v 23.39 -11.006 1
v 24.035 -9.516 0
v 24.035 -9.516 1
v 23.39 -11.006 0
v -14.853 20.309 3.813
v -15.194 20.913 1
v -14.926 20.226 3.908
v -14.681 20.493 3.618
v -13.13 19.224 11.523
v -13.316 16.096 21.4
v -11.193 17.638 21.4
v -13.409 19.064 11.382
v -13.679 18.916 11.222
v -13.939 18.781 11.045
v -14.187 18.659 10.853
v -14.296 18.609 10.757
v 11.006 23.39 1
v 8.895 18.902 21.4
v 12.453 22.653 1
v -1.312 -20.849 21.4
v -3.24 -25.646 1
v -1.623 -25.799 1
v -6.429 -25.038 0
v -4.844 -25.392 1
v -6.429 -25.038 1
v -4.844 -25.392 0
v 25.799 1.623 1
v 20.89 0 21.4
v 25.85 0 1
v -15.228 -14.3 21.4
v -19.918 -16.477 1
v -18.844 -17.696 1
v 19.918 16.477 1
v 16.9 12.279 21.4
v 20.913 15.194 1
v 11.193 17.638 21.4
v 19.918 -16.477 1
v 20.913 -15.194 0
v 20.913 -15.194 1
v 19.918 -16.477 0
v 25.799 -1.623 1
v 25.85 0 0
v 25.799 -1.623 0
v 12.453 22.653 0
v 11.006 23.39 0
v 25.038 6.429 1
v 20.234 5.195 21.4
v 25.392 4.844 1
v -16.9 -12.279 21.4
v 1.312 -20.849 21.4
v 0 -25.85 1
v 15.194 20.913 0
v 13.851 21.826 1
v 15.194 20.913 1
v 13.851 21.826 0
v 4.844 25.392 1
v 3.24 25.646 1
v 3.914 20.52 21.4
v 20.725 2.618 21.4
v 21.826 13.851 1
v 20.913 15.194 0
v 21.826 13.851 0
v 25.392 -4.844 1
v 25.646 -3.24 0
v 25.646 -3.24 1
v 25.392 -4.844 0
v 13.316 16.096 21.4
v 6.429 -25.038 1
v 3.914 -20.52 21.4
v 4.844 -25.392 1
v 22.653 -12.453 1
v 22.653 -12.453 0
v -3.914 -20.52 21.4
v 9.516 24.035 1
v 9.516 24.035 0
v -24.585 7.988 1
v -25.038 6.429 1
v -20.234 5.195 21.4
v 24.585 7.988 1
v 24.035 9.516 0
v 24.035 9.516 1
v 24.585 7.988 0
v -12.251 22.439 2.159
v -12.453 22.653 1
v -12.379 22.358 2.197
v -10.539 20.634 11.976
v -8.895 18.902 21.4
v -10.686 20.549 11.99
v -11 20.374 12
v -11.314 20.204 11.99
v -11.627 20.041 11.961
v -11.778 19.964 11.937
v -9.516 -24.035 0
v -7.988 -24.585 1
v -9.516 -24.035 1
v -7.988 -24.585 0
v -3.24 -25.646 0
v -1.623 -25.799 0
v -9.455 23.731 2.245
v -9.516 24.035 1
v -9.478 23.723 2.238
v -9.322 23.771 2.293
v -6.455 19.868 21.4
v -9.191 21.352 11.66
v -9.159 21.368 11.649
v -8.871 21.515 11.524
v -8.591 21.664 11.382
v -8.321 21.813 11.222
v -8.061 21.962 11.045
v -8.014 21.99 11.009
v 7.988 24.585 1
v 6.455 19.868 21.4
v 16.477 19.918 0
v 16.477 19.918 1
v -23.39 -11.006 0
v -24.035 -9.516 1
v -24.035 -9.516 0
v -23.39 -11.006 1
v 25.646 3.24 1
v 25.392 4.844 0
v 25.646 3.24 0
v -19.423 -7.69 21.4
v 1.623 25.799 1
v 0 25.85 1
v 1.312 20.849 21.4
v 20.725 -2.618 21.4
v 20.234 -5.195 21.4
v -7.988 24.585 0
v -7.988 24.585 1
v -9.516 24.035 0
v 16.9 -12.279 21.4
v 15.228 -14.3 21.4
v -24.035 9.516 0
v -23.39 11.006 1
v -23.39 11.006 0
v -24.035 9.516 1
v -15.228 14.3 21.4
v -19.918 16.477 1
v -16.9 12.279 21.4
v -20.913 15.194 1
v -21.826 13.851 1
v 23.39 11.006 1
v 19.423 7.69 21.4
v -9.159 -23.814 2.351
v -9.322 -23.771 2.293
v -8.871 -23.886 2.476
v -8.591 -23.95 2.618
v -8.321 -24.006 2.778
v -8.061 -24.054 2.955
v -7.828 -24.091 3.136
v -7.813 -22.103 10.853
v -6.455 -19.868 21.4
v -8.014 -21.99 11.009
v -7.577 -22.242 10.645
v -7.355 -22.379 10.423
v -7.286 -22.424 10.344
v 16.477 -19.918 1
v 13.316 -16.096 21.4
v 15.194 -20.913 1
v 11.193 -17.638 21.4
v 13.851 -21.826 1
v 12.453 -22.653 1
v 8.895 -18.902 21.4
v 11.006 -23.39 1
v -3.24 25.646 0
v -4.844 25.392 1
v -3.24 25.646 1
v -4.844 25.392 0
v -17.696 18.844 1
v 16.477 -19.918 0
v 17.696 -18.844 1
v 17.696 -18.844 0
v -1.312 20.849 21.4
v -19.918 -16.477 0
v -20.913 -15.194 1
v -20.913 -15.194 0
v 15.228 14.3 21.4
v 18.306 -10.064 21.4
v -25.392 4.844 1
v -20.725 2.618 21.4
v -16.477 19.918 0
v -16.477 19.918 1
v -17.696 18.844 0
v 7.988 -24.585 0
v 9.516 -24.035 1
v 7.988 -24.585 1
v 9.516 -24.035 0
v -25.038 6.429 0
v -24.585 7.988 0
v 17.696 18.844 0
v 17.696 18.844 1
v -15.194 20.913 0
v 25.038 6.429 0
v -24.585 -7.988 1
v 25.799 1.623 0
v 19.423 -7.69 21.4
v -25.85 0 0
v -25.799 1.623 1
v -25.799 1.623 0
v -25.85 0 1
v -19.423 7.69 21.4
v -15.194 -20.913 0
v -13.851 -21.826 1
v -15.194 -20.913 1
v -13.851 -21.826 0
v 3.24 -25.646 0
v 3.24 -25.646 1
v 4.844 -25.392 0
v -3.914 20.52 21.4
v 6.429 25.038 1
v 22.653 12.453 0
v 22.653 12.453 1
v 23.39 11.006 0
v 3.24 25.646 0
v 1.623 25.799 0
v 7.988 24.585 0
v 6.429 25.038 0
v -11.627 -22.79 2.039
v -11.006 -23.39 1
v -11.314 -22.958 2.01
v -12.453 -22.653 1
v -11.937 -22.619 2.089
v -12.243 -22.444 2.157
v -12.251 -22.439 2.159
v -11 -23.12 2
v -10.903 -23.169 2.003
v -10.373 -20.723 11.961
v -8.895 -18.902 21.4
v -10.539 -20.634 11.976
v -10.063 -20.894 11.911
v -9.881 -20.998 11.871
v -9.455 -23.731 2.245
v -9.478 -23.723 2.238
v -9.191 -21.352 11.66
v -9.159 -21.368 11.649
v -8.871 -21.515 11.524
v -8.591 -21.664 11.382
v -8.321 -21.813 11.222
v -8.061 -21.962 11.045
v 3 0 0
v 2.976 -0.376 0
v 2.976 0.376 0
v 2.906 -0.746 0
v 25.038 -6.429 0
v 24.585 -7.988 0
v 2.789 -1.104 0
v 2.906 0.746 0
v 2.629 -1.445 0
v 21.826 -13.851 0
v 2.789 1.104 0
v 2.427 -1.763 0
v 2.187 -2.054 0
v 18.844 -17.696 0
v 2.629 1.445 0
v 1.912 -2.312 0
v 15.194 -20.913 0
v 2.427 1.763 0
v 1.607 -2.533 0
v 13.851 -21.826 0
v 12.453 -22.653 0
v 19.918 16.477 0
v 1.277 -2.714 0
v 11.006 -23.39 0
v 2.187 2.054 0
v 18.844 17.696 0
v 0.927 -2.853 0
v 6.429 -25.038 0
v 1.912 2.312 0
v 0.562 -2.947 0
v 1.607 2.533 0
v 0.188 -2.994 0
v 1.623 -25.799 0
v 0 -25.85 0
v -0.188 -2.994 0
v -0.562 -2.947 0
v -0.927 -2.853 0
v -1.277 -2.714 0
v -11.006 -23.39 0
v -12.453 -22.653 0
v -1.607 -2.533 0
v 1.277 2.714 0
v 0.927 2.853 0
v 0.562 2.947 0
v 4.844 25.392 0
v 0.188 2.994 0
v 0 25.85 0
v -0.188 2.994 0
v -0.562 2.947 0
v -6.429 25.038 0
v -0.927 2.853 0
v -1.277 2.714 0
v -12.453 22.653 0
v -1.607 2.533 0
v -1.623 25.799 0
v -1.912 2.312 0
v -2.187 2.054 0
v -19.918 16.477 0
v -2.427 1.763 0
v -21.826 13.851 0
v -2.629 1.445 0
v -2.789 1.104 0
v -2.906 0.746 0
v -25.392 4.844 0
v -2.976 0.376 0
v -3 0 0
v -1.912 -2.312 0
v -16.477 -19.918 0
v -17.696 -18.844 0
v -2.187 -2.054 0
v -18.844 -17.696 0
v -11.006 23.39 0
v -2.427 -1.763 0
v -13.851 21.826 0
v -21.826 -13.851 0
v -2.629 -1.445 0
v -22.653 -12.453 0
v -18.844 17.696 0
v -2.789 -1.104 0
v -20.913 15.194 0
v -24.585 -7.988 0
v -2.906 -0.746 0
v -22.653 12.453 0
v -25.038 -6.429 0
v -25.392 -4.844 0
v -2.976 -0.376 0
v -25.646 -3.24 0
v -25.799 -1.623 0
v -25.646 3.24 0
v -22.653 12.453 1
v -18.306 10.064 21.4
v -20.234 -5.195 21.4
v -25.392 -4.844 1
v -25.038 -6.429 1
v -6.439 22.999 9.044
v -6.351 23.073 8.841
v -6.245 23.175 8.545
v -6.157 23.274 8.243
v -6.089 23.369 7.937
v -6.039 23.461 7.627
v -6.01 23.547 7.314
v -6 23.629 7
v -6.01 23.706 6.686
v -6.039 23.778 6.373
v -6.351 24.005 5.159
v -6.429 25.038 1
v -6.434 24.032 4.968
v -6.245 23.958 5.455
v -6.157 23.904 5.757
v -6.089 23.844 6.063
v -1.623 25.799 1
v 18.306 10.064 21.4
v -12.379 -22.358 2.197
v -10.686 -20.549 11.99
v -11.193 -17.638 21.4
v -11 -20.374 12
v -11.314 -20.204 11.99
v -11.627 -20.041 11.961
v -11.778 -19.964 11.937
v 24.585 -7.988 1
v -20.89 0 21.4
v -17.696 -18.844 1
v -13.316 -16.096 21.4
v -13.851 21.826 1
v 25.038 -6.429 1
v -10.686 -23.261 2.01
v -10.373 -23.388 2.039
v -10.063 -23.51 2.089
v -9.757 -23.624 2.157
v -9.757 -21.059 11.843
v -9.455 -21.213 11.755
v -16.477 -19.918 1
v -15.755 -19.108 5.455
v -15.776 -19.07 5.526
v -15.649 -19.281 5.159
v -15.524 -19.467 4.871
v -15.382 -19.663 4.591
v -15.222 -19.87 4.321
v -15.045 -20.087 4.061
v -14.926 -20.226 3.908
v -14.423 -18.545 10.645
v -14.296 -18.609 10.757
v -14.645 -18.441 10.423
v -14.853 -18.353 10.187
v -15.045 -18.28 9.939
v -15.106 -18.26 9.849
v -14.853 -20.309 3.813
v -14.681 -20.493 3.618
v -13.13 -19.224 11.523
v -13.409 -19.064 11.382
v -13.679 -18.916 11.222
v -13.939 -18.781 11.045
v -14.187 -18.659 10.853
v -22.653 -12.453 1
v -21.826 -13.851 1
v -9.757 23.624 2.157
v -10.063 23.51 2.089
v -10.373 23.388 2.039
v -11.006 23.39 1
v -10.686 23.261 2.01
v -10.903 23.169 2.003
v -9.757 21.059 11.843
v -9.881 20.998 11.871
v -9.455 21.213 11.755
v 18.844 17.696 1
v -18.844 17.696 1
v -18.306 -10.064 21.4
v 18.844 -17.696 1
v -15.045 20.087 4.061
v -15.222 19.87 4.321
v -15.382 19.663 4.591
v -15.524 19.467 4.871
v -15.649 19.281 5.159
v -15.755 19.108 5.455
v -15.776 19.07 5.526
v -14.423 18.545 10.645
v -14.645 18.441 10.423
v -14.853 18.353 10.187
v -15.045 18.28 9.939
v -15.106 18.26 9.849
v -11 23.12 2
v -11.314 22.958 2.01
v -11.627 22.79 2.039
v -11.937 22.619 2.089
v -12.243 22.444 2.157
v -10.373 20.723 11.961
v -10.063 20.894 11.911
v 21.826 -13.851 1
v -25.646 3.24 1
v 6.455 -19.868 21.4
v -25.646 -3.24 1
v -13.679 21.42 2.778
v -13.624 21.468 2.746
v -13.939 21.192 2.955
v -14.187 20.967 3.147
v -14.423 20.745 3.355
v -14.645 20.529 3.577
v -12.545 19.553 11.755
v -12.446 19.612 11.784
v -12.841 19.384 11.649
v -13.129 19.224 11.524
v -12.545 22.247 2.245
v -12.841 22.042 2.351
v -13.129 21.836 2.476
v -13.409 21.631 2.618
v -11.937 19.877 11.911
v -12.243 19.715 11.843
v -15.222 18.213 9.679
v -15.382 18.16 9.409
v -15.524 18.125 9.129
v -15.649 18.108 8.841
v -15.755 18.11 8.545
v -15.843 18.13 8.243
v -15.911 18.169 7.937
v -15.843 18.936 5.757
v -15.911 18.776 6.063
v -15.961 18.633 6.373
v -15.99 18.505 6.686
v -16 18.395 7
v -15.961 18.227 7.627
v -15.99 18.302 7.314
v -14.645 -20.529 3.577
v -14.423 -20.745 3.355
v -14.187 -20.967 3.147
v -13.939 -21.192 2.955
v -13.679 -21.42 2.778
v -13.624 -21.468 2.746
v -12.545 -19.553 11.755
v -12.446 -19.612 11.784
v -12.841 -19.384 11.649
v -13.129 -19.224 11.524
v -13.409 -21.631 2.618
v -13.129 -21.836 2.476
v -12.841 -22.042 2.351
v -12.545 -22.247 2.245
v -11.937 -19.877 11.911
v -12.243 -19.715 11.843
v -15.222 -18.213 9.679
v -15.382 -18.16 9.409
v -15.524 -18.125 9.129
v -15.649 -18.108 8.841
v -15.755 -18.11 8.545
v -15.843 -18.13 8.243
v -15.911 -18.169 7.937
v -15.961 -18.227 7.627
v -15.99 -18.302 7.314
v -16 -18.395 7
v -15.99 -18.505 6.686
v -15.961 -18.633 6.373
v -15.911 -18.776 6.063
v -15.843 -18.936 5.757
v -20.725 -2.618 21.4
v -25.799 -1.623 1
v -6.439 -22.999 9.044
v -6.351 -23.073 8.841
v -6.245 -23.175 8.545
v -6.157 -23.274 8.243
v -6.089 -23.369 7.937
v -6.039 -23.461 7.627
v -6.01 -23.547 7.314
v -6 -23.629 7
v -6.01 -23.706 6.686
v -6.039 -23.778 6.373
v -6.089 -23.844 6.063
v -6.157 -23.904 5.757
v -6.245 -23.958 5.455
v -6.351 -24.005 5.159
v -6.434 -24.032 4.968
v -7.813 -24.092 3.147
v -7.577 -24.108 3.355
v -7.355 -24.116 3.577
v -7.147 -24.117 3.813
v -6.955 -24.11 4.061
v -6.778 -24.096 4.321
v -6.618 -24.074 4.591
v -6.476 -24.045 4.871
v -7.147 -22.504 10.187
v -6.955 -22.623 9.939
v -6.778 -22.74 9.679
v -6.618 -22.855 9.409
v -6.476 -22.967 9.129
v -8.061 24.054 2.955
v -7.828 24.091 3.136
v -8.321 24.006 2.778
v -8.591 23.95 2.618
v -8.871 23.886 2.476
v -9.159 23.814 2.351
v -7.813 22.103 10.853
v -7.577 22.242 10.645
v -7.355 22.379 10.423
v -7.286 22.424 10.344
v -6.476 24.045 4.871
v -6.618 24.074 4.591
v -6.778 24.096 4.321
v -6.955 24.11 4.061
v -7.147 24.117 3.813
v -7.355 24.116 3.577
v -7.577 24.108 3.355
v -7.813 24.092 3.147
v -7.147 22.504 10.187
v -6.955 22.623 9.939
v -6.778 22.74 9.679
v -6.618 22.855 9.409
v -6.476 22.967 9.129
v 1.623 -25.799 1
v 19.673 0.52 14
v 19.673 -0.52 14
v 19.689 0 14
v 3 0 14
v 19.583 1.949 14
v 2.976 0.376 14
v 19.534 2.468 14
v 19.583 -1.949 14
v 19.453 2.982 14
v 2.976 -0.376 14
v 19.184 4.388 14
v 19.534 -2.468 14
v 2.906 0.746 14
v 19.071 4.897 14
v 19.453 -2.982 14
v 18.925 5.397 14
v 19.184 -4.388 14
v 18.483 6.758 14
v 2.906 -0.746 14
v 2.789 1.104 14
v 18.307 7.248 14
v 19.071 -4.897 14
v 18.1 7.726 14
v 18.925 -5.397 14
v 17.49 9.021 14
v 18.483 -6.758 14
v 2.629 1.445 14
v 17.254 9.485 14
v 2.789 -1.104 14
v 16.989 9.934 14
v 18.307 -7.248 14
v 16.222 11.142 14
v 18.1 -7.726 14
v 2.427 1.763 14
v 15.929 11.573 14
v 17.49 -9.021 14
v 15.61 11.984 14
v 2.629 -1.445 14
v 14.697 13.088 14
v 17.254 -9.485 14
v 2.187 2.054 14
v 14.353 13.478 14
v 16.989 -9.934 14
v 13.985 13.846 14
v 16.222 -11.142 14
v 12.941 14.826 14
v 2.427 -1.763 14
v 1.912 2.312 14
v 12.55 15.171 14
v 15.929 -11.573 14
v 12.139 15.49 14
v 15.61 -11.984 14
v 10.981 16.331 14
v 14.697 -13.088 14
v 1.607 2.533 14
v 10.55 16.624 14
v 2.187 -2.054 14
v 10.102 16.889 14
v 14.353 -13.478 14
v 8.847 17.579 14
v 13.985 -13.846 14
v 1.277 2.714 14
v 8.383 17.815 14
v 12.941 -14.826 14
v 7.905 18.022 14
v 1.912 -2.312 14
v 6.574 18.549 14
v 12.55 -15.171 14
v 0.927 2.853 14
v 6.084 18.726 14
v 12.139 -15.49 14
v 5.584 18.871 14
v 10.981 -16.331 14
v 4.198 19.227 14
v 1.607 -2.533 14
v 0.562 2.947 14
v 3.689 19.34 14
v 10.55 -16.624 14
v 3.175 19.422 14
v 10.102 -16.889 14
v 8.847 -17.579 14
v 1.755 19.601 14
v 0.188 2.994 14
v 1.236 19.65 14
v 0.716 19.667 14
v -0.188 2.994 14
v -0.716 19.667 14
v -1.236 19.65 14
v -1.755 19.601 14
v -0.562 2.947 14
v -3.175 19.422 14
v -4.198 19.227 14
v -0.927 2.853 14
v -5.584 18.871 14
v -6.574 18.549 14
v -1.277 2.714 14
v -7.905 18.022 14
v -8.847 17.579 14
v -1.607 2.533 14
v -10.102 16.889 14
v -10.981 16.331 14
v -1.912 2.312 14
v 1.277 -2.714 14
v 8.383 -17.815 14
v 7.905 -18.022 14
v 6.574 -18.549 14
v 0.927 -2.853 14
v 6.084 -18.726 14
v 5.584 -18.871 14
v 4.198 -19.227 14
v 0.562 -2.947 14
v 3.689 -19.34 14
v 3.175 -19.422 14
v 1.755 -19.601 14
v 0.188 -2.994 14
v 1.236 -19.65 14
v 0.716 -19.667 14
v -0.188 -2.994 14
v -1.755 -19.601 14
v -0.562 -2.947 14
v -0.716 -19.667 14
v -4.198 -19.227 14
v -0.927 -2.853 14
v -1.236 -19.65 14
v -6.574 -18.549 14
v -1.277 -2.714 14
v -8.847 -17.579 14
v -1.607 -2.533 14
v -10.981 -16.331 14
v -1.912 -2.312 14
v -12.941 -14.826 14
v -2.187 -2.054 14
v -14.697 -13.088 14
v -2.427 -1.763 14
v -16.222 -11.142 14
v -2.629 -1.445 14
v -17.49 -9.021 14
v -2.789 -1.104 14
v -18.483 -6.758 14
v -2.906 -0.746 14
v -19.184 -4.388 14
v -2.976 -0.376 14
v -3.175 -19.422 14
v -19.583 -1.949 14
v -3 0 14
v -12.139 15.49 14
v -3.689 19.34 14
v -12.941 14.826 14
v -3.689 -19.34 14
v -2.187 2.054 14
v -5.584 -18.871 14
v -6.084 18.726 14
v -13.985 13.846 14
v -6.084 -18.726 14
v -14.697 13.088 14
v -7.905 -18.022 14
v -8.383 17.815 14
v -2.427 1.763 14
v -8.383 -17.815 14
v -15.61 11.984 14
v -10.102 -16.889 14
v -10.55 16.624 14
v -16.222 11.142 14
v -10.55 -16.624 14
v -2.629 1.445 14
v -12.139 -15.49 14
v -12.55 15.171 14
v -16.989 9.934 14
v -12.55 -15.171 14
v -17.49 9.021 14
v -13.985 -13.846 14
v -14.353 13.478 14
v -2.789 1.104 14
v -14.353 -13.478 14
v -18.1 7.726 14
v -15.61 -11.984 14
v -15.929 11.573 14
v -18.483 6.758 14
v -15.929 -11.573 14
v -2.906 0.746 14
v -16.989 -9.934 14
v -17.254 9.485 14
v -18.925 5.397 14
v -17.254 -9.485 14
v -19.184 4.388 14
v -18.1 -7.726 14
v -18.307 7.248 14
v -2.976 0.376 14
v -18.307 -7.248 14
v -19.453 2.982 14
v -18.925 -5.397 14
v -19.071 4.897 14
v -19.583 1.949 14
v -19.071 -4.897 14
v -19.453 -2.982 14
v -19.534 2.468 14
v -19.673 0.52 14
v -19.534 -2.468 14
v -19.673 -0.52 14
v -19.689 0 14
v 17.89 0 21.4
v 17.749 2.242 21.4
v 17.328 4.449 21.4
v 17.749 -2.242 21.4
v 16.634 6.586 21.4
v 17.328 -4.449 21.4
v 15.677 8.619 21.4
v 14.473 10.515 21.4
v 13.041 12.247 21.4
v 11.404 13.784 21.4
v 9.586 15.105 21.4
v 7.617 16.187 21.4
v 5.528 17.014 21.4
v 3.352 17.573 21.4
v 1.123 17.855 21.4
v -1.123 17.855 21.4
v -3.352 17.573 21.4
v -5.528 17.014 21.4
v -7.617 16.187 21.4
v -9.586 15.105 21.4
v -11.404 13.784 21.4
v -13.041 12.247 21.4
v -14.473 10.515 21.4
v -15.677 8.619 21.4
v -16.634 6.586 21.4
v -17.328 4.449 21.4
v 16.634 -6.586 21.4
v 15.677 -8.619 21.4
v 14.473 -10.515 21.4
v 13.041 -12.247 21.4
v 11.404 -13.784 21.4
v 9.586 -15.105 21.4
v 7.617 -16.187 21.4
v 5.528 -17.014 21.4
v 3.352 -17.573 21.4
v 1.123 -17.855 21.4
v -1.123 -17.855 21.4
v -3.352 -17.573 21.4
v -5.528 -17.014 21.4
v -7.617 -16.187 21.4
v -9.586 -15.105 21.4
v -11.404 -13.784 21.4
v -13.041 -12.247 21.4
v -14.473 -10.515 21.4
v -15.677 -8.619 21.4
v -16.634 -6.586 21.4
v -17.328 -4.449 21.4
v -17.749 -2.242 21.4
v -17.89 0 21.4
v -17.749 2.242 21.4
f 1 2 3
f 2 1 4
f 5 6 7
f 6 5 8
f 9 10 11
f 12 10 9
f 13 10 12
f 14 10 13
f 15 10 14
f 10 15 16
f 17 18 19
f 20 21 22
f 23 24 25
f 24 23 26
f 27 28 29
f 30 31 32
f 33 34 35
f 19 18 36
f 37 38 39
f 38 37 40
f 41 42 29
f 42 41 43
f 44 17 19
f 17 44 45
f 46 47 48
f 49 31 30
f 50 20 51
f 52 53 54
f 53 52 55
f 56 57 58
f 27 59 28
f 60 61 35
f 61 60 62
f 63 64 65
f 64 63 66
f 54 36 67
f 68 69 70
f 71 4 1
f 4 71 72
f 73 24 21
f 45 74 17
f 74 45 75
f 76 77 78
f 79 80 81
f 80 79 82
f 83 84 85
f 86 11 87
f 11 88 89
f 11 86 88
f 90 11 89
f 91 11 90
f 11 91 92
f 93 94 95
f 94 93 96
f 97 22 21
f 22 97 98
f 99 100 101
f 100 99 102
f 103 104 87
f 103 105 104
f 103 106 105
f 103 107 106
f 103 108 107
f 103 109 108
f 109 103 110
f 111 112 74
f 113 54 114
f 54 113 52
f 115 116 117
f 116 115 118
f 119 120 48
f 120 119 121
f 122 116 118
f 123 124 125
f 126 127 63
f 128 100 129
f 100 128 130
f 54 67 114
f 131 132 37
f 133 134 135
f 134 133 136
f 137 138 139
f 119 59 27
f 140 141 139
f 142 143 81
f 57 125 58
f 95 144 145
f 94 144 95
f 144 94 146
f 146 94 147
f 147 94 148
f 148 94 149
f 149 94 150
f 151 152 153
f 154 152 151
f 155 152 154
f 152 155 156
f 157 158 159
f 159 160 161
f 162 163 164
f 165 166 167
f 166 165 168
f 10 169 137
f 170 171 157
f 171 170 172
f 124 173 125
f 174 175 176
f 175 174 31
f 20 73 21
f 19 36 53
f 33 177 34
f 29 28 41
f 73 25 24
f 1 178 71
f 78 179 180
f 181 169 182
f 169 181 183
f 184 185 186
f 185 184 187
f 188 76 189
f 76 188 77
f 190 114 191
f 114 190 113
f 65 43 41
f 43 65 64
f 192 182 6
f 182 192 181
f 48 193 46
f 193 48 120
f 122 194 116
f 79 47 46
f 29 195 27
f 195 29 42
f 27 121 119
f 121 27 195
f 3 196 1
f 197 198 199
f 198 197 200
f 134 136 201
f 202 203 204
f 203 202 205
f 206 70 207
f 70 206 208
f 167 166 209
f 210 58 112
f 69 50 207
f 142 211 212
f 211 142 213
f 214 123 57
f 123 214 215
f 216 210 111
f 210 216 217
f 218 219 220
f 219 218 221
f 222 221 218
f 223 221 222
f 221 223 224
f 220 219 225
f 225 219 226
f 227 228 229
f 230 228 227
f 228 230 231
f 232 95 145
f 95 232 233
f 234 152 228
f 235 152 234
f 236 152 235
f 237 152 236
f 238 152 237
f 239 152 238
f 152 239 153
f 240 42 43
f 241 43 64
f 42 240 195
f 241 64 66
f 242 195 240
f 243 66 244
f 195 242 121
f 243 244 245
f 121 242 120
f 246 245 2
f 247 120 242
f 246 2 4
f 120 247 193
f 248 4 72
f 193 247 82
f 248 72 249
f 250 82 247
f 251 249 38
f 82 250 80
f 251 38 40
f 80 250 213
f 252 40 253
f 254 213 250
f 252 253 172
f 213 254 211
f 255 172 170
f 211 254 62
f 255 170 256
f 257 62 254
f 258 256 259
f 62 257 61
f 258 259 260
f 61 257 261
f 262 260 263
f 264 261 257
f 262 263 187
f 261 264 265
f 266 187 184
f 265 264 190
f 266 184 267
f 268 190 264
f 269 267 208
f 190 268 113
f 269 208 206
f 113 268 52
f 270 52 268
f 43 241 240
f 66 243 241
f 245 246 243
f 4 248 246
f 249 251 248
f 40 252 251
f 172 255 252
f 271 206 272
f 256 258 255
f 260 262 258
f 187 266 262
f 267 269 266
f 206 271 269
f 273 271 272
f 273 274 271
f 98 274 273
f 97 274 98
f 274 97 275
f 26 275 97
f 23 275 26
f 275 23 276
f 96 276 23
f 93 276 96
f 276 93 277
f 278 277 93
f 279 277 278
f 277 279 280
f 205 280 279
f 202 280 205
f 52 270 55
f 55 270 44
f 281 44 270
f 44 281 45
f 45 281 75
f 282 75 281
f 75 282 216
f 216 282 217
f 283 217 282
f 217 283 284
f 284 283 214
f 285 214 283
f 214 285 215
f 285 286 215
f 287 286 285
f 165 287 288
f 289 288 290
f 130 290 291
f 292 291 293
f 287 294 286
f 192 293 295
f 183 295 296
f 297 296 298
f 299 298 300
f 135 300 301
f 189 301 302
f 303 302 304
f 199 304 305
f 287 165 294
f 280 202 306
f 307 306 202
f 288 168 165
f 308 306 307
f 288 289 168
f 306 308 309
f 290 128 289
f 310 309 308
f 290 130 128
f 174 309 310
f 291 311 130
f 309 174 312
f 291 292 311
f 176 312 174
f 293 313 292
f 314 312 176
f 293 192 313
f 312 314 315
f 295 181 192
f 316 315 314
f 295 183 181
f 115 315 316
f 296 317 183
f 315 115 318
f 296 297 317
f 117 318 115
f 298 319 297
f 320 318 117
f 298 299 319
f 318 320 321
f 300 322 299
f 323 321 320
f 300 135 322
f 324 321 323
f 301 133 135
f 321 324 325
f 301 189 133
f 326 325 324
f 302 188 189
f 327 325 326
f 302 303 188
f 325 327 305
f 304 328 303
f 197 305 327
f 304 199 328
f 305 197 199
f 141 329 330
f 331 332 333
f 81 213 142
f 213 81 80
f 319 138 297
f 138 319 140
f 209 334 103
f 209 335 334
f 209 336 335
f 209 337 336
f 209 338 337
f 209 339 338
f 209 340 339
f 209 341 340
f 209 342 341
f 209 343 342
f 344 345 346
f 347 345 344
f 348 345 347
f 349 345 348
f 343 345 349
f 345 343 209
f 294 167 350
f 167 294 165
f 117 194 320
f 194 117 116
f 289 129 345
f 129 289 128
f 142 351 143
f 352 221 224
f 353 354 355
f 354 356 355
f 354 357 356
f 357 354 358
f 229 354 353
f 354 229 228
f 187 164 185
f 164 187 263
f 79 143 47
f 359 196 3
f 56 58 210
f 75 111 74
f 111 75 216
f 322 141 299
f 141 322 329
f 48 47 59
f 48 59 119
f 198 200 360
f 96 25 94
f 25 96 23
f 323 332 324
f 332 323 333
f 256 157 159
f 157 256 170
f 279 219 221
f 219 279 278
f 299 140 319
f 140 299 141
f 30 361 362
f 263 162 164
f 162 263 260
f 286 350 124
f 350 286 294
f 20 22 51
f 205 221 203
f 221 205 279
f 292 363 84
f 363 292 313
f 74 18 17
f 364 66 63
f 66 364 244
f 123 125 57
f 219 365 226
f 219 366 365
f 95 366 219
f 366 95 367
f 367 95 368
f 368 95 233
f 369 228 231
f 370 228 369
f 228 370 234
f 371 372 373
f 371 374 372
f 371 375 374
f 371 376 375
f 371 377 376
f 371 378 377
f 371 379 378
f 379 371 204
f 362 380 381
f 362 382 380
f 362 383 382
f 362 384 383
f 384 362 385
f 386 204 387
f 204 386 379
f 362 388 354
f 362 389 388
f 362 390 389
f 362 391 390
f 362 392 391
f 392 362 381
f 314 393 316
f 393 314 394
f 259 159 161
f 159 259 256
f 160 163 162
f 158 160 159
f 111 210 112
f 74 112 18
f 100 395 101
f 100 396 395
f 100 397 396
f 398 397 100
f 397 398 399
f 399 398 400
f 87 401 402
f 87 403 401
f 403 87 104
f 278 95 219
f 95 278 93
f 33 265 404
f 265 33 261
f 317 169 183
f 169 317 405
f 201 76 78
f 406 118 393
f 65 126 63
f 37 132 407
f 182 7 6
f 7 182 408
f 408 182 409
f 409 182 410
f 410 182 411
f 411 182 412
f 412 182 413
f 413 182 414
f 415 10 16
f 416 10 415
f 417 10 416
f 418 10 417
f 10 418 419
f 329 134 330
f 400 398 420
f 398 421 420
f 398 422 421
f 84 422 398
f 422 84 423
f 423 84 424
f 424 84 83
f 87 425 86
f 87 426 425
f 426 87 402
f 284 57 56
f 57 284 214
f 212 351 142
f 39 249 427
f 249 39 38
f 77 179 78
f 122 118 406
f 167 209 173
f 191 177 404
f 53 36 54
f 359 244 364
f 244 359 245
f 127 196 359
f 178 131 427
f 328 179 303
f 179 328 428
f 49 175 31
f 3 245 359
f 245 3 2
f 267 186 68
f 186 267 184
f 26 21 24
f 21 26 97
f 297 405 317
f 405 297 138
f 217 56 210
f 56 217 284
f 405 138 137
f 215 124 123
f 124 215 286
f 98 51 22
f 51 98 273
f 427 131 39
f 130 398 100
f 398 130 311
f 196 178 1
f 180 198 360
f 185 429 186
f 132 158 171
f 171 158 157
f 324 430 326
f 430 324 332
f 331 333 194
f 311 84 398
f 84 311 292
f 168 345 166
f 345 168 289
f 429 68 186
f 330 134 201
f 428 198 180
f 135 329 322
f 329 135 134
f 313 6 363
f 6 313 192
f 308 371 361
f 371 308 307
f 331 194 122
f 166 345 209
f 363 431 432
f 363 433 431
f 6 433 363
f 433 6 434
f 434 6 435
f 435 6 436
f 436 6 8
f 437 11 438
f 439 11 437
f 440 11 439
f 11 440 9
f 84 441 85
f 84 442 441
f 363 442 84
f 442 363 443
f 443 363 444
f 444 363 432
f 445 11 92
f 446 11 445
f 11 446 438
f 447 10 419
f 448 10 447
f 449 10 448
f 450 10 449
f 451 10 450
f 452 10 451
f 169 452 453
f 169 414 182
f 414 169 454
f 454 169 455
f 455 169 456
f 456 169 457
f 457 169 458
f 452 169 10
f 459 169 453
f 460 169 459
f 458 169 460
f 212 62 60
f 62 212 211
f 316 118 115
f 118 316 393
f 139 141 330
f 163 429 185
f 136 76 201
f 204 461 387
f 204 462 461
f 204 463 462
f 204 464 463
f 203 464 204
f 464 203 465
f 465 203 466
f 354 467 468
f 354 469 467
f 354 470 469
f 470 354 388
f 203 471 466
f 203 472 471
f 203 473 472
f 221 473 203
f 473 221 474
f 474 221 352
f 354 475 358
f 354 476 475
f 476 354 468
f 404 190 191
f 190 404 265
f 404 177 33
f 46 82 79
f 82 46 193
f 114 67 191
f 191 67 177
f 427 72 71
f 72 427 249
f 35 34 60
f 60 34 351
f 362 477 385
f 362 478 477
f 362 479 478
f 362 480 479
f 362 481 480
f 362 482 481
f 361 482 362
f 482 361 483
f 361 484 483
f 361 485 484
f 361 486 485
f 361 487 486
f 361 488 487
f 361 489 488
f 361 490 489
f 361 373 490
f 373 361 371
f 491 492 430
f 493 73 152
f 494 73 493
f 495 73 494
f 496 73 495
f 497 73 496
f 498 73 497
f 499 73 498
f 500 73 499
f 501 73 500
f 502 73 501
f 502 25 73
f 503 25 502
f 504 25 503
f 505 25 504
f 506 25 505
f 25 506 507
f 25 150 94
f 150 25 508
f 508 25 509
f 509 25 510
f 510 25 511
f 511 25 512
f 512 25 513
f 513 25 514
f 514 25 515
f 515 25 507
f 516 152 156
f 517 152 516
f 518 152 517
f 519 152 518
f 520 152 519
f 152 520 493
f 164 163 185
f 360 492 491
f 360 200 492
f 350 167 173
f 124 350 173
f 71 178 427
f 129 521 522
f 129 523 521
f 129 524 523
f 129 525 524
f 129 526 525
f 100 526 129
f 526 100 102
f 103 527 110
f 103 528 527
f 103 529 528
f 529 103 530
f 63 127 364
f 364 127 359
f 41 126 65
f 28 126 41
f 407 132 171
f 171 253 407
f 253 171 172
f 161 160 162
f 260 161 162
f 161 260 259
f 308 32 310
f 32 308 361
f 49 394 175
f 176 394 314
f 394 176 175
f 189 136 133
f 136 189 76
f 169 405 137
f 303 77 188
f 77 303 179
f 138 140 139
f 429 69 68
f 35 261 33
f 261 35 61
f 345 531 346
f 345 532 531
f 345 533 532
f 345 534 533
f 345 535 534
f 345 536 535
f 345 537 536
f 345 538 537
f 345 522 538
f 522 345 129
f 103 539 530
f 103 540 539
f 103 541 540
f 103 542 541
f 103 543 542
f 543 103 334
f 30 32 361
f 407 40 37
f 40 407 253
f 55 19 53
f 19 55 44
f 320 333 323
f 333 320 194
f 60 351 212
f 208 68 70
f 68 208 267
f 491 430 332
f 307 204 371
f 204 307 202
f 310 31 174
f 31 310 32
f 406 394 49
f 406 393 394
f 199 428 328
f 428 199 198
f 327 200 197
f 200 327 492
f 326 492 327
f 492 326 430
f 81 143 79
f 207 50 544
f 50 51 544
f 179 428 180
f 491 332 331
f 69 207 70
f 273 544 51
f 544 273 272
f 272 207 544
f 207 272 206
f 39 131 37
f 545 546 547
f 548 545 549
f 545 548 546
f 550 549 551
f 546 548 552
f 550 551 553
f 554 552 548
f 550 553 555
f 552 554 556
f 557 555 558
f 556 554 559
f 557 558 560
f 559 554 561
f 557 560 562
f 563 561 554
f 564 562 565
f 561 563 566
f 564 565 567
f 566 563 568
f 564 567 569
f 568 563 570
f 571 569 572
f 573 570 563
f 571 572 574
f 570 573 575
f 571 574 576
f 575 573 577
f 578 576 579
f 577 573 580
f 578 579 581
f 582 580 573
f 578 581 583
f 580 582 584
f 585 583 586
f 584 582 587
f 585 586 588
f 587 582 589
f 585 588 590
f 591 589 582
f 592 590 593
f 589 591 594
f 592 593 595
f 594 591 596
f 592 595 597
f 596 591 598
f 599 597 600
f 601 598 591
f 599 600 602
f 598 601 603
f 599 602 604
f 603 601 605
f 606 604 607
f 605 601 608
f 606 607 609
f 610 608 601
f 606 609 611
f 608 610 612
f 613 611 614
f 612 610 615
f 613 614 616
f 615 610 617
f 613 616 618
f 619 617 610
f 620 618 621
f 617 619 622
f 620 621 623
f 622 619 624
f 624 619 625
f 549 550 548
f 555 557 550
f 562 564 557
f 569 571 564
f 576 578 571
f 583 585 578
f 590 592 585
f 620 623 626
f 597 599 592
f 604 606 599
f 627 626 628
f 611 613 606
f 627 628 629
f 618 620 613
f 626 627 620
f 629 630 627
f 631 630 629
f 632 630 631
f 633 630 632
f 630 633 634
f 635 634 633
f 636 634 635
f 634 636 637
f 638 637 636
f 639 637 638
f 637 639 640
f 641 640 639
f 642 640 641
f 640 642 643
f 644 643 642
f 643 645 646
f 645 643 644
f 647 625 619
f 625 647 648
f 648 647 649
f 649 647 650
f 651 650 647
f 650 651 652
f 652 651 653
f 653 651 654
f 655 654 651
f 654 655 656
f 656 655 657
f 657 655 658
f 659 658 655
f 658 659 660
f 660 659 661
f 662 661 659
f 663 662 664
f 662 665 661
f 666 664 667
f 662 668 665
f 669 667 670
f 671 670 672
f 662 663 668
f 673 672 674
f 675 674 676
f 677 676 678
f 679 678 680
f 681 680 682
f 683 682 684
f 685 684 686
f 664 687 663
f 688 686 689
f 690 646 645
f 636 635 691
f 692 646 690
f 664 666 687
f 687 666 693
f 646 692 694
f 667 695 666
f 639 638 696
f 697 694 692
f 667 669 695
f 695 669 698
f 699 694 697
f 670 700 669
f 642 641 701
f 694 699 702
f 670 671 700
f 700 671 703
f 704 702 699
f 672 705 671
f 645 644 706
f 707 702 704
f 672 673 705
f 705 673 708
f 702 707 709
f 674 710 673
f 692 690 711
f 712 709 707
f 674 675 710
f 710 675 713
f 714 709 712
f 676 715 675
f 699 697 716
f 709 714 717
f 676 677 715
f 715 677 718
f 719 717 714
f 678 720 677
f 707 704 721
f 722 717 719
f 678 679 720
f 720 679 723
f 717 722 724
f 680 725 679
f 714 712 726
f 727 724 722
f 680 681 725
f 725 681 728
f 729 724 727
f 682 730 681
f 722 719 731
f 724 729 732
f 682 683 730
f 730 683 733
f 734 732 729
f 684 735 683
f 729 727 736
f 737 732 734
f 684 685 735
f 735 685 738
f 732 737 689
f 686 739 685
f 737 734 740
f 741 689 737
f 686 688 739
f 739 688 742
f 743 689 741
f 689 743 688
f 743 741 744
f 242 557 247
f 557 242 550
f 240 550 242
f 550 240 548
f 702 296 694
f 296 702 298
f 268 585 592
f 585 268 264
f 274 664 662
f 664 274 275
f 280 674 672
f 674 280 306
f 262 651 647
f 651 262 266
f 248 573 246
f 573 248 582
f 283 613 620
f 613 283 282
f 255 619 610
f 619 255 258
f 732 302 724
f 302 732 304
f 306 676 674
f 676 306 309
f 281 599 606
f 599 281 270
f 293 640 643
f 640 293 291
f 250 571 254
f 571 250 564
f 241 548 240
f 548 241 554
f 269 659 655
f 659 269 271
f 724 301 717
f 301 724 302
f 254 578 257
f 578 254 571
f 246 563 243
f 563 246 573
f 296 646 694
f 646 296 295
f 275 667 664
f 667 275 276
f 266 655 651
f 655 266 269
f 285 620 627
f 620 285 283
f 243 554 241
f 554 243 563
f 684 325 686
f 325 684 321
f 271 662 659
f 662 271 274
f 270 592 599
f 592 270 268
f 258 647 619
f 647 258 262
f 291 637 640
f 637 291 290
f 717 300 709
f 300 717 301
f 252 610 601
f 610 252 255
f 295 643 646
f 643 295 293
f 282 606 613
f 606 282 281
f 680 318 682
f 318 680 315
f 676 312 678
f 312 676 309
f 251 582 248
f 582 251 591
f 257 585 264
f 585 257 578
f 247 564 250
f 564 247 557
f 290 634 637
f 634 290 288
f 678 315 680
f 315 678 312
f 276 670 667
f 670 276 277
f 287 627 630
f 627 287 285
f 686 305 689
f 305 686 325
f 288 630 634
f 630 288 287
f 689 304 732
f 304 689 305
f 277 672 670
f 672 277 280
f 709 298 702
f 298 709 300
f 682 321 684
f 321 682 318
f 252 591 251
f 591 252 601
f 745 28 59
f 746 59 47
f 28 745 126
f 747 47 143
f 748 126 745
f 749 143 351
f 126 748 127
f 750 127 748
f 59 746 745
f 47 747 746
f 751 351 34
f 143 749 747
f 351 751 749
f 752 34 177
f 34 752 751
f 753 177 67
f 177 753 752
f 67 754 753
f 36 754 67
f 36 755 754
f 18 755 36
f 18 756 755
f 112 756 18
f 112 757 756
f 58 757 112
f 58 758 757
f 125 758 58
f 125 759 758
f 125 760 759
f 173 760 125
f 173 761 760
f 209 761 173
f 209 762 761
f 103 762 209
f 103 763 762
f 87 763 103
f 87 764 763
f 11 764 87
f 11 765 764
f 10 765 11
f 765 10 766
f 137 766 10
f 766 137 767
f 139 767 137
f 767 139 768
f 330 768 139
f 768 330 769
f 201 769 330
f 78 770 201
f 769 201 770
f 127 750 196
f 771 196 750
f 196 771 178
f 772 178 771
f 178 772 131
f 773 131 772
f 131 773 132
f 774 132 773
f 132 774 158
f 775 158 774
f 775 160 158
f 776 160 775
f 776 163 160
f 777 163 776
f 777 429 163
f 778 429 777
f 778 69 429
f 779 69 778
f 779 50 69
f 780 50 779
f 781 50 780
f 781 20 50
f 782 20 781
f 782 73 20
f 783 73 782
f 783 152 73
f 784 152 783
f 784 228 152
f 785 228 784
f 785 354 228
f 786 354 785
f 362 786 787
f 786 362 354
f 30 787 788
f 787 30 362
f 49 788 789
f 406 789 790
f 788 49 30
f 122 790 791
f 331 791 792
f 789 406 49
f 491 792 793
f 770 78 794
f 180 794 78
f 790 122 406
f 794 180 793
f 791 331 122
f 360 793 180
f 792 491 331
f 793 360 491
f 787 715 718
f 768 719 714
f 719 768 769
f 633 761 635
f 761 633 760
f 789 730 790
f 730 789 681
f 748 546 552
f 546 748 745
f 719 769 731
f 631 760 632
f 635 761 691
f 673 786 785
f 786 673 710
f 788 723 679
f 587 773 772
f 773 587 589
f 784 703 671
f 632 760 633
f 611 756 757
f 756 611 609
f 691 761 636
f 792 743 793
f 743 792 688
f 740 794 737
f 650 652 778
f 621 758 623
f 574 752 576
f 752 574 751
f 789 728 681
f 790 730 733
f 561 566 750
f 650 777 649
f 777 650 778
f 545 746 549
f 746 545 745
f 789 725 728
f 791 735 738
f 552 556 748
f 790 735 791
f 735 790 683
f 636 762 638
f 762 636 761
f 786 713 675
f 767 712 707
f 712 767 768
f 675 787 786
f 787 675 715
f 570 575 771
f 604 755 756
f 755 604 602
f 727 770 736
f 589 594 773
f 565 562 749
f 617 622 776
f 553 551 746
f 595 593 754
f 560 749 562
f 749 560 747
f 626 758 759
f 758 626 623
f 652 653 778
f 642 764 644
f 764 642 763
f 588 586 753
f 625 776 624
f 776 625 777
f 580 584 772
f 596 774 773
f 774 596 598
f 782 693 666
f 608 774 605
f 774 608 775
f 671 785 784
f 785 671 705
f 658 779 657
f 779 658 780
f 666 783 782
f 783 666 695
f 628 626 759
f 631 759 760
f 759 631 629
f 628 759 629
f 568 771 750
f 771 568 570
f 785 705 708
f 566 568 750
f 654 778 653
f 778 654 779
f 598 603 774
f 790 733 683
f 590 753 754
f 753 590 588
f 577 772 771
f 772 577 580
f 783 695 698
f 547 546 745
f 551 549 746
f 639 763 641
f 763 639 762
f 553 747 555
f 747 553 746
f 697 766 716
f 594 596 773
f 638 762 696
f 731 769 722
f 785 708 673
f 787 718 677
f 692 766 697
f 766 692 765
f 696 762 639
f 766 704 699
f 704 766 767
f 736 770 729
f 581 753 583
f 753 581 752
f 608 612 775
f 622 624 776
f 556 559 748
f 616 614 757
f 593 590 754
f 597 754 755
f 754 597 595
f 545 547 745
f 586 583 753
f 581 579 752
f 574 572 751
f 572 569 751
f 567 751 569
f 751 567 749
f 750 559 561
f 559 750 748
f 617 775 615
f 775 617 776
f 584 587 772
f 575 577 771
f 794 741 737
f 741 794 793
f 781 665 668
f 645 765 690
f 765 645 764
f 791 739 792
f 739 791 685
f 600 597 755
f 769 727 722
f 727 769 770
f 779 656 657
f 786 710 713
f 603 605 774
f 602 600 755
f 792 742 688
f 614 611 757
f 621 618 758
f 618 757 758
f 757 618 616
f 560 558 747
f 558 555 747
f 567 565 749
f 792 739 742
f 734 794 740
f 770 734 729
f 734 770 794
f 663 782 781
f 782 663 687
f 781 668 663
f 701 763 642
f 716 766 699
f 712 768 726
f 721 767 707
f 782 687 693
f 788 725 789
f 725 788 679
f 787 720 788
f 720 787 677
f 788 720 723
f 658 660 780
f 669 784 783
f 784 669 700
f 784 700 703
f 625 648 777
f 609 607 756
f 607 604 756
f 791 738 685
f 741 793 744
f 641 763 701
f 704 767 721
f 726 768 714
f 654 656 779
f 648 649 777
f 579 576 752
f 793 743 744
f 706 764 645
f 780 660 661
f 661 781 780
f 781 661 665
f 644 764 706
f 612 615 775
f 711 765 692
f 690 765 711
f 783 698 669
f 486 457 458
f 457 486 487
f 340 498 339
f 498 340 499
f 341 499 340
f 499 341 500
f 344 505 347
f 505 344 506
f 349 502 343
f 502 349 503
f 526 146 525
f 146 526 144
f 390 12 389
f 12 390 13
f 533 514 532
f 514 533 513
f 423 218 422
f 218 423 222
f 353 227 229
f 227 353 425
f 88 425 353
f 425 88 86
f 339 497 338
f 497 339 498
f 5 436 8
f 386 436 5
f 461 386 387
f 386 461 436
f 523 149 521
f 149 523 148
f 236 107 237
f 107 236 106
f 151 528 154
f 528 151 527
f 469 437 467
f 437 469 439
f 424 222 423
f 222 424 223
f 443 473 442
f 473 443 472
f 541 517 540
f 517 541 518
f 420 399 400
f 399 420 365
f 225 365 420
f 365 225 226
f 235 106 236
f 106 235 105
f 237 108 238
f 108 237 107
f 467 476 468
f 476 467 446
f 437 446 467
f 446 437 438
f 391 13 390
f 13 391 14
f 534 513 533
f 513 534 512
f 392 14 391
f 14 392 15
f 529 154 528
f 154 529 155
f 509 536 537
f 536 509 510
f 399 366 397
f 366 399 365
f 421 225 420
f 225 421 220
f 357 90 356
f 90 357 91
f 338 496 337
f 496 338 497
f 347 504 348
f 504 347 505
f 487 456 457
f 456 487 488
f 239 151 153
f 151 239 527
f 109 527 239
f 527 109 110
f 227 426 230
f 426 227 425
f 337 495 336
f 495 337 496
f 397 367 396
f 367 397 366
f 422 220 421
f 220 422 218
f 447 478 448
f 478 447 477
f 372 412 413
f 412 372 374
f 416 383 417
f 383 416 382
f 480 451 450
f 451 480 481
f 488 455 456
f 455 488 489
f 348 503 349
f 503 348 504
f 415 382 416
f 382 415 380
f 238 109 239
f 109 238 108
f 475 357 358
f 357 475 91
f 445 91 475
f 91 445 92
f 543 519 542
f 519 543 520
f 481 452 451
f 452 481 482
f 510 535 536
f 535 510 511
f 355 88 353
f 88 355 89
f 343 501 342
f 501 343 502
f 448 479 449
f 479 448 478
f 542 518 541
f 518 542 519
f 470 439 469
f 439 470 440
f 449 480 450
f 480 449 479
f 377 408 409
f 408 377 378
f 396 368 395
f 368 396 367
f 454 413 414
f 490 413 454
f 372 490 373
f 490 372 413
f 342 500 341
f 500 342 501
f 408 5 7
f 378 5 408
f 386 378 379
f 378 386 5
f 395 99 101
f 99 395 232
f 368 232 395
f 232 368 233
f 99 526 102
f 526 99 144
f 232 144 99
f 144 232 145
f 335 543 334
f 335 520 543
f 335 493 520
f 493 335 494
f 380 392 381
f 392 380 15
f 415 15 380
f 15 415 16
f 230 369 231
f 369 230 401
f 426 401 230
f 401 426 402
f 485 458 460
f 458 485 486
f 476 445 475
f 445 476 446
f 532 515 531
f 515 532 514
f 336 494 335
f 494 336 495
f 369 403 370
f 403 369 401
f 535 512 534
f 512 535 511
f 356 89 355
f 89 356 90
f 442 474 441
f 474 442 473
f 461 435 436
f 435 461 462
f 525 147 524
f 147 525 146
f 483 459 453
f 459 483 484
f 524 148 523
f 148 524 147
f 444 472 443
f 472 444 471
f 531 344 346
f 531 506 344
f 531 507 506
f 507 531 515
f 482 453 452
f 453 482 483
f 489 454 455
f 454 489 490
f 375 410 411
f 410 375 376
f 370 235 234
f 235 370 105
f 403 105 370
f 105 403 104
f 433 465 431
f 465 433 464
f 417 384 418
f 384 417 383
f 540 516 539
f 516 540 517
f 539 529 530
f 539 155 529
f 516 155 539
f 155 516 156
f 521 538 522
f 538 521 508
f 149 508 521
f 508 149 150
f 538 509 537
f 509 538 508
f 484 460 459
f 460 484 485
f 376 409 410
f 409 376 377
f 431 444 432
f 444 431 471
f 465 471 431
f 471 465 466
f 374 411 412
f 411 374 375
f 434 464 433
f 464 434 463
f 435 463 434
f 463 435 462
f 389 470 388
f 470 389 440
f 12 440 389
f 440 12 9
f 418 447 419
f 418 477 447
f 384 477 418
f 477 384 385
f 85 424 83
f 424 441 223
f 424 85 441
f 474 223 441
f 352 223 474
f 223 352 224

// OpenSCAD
Big_outter_diameter = 51.7;
Big_inner_diameter = 45.5;
Little_outter_diameter = 41.78;
Little_inner_diameter = 28.4;
Side_length = 20.4;
Hole_for_screw_diameter = 6;
Holding_stem_diameter = 10;
Holding_plate_height = Holding_stem_diameter + 4;
    
module joint(minus_thickness){
    hull(){
            translate([0,0,Side_length]){
                cylinder(h=1, r=Little_outter_diameter/2-minus_thickness, $fn=50);}
            cylinder(h=1, r=Big_outter_diameter/2-minus_thickness, $fn=100);
            }
        }
module joint_with_hole(){
    difference(){
        joint(0);
        joint(3);
    }
}

module holding_plate(){
    difference(){
        joint(0);
        translate([0,0,Holding_plate_height]){
            cylinder(h=10, d=Big_outter_diameter, $fn=100);
        }
        //add the hole
        cylinder(h=Holding_plate_height,d=Hole_for_screw_diameter,$fn=50);
    }
}

module holding_stem(){
    translate([-(Hole_for_screw_diameter+(Holding_stem_diameter/2)),Big_outter_diameter/2,(Holding_stem_diameter/2)+2]){
        rotate([90,0,0]){
            color("green")cylinder(h=Big_outter_diameter, d=Holding_stem_diameter , $fn=100);
        }
    }
}

module joint_with_plate(){
    holding_plate();
    joint_with_hole();    
}
//main

difference(){
    joint_with_plate();    
    holding_stem();
}
